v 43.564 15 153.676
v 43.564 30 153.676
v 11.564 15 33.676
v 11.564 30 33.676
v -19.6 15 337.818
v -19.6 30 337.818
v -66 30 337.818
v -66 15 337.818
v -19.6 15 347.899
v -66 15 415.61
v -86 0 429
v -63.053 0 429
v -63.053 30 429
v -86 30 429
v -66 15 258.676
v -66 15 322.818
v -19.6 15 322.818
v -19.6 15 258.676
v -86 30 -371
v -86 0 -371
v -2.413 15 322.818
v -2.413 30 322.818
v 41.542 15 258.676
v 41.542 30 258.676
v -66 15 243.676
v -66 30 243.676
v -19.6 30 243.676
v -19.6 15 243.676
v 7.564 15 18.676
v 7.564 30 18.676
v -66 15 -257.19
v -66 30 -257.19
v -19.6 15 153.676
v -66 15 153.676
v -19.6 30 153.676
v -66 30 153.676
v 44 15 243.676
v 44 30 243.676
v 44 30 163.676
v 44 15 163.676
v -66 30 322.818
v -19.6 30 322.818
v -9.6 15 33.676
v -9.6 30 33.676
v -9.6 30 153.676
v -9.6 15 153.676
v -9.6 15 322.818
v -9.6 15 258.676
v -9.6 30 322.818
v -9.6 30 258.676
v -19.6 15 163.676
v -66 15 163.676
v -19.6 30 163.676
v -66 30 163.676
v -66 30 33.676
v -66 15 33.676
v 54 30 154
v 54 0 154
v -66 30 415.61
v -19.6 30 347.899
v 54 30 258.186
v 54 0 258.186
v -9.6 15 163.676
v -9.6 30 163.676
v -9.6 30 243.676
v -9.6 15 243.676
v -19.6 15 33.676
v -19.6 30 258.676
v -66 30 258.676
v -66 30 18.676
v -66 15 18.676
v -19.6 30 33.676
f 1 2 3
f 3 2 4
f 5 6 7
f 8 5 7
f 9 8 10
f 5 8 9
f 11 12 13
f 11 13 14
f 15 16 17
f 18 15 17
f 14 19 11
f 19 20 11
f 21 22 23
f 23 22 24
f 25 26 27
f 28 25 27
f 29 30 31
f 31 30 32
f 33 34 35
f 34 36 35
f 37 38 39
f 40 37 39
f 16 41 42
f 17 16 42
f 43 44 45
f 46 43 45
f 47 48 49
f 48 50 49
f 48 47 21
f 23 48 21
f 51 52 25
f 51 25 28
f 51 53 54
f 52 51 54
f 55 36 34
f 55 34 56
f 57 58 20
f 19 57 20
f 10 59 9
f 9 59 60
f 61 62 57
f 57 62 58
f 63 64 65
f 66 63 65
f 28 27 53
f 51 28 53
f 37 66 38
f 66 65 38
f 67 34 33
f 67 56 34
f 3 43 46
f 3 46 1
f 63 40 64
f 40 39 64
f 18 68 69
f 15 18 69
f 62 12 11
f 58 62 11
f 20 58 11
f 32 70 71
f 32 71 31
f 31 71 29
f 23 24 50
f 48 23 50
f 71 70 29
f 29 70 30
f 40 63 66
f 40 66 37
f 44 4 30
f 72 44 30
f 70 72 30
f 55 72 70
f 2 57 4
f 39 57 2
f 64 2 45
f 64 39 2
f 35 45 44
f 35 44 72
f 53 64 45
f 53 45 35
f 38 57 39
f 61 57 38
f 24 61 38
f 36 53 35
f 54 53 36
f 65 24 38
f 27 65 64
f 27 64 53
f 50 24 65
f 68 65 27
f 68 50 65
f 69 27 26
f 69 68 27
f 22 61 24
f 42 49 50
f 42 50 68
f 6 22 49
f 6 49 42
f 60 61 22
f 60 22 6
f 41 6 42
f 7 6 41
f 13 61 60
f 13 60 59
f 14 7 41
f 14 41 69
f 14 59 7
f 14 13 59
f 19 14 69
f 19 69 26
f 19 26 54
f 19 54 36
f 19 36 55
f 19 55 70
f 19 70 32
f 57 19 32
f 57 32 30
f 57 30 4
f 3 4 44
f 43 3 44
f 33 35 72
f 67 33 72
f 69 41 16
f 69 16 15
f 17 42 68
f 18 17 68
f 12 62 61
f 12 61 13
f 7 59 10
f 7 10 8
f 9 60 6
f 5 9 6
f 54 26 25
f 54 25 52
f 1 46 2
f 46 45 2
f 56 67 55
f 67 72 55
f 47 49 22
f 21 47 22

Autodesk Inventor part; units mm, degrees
ref_plane "YZ Plane" through (0, 0, 0) normal (1, 0, 0) x (0, 1, 0)
ref_plane "XZ Plane" through (0, 0, 0) normal (0, 1, 0) x (-1, 0, 0)
ref_plane "XY Plane" through (0, 0, 0) normal (0, 0, 1) x (1, 0, 0)
sketch "Sketch1" plane through (0, 0, 0) normal (0, 1, 0) x (-1, 0, 0)
  line L0 (86, 229) -> (-74, 229)
  line L1 (-74, 229) -> (-74, -371)
  line L2 (-74, -371) -> (86, -371)
  line L3 (86, -371) -> (86, 229)
  line L4 (86, 229) -> (-74, 229)
  line L5 (-74, 229) -> (-74, 429)
  line L6 (-74, 429) -> (86, 429)
  line L7 (86, 429) -> (86, 229)
  line L8 (-74, 229) -> (86, -371)
  line L9 (-74, 229) -> (63.0532, 429)
  line L10 (-74, 429) -> (-54, 429)
  line L11 (-54, 429) -> (-54, -371)
  line L12 (-54, -371) -> (-74, -371)
  line L13 (-74, -371) -> (-74, 429)
  point P0 (0, 0)
  point P1 (-54, 258.1857)
  point P2 (-54, 154)
  dimension "d0" = 600
  dimension "d1" = 200
  dimension "d2" = 160
  dimension "d3" = 20
extrude "Extrusion1" add sketch "Sketch1" along normal blind 30 contours L3 L8 L11 L0 | L0 L11 L9 L6 L7
sketch "Sketch2" plane through (0, 30, 0) normal (0, 1, 0) x (1, 0, 0)
  line L0 (75.5798, -163.6757) -> (-122, -163.6757)
  line L1 (-122, -163.6757) -> (-122, -153.6757)
  line L2 (-122, -153.6757) -> (75.5798, -153.6757)
  line L3 (75.5798, -153.6757) -> (75.5798, -163.6757)
  line L4 (143.751, -33.6757) -> (-97.1737, -33.6757)
  line L5 (-97.1737, -33.6757) -> (-97.1737, -18.6757)
  line L6 (-97.1737, -18.6757) -> (143.751, -18.6757)
  line L7 (143.751, -18.6757) -> (143.751, -33.6757)
  line L8 (152.9485, -258.6757) -> (-87.9762, -258.6757)
  line L9 (-87.9762, -258.6757) -> (-87.9762, -243.6757)
  line L10 (-87.9762, -243.6757) -> (152.9485, -243.6757)
  line L11 (152.9485, -243.6757) -> (152.9485, -258.6757)
  line L12 (-86, -429) -> (-63.0532, -429) projected
  line L13 (-63.0532, -429) -> (54, -258.1857) projected
  line L14 (54, -258.1857) -> (54, -154) projected
  line L15 (54, -154) -> (-86, 371) projected
  line L16 (-86, 371) -> (-86, -429) projected
  line L17 (-76, -419) -> (-68.3232, -419)
  line L18 (-68.3232, -419) -> (44, -255.0882)
  line L19 (44, -255.0882) -> (44, -155.3104)
  line L20 (44, -155.3104) -> (-76, 294.6896)
  line L21 (-76, 294.6896) -> (-76, -419)
  line L22 (38.103, -337.8179) -> (-236.6655, -337.8179)
  line L23 (-236.6655, -337.8179) -> (-236.6655, -322.8179)
  line L24 (-236.6655, -322.8179) -> (38.103, -322.8179)
  line L25 (38.103, -322.8179) -> (38.103, -337.8179)
  line L26 (-19.6002, -33.6757) -> (-9.6002, -33.6757)
  line L27 (-9.6002, -33.6757) -> (-9.6002, -433)
  line L28 (-9.6002, -433) -> (-19.6002, -433)
  line L29 (-19.6002, -433) -> (-19.6002, -33.6757)
  line L30 (-76, -419) -> (-66, -419)
  line L31 (-66, -419) -> (-66, 295.0501)
  line L32 (-66, 295.0501) -> (-76, 295.0501)
  line L33 (-76, 295.0501) -> (-76, -419)
  point P0 (0, 0)
  point P1 (-76, -18.6757)
  point P2 (7.5641, -18.6757)
  point P3 (-76, -33.6757)
  point P4 (-76, -153.6757)
  point P5 (44, -159.6038)
  point P6 (11.5641, -33.6757)
  point P7 (-76, -163.6757)
  point P8 (-76, -243.6757)
  point P9 (38.3772, -263.2935)
  point P10 (44, -163.6757)
  point P11 (41.5416, -258.6757)
  point P12 (-76, -258.6757)
  point P13 (-94.6892, -355.1147)
  point P14 (-104.6892, -352.0171)
  point P15 (43.5641, -153.6757)
  point P16 (44, -243.6757)
  point P17 (-86, -163.6757)
  point P18 (-86, -243.6757)
  point P19 (-86, -33.6757)
  point P20 (-86, -153.6757)
  point P21 (53.9135, -153.6757)
  point P22 (21.9135, -33.6757)
  point P23 (17.9135, -18.6757)
  point P24 (-86, -18.6757)
  point P25 (-86, -258.6757)
  point P26 (54, -163.6757)
  point P27 (-86, -337.8179)
  point P28 (-86, -322.8179)
  point P29 (54, -243.6757)
  point P30 (53.6642, -258.6757)
  point P31 (9.7098, -322.8179)
  point P32 (-0.5692, -337.8179)
  point P33 (-9.6002, -350.9967)
  point P34 (-19.6002, -365.5895)
  point P35 (-66, 257.1896)
  point P36 (-66, -18.6757)
  point P37 (-9.6002, -33.6757)
  point P38 (-9.6002, -153.6757)
  point P39 (-66, -33.6757)
  point P40 (-66, -153.6757)
  point P41 (-19.6002, -153.6757)
  point P42 (-66, -163.6757)
  point P43 (-66, -243.6757)
  point P44 (-19.6002, -243.6757)
  point P45 (-19.6002, -163.6757)
  point P46 (-9.6002, -163.6757)
  point P47 (-9.6002, -243.6757)
  point P48 (-9.6002, -258.6757)
  point P49 (-9.6002, -322.8179)
  point P50 (-2.4129, -322.8179)
  point P51 (-66, -258.6757)
  point P52 (-66, -322.8179)
  point P53 (-19.6002, -322.8179)
  point P54 (-19.6002, -258.6757)
  point P55 (-66, -337.8179)
  point P56 (-66, -415.6098)
  point P57 (-19.6002, -347.8991)
  point P58 (-19.6002, -337.8179)
  dimension "d6" = 10
  dimension "d7" = 15
  dimension "d8" = 15
  dimension "d9" = 120
  dimension "d10" = 80
  dimension "d11" = 10
  dimension "d15" = 15
  dimension "d16" = 10
  dimension "d17" = 20
extrude "Extrusion2" cut sketch "Sketch2" against normal blind 15 contours L19 L10 L27 L0 | L2 L27 L4 L20 | L29 L10 L31 L0 | L2 L31 L4 L29 | L8 L18 L24 L27 | L6 L31 L20 | L29 L24 L31 L8 | L29 L18 L31 L22
properties part number "Nozki" material "Aluminum 6061"
